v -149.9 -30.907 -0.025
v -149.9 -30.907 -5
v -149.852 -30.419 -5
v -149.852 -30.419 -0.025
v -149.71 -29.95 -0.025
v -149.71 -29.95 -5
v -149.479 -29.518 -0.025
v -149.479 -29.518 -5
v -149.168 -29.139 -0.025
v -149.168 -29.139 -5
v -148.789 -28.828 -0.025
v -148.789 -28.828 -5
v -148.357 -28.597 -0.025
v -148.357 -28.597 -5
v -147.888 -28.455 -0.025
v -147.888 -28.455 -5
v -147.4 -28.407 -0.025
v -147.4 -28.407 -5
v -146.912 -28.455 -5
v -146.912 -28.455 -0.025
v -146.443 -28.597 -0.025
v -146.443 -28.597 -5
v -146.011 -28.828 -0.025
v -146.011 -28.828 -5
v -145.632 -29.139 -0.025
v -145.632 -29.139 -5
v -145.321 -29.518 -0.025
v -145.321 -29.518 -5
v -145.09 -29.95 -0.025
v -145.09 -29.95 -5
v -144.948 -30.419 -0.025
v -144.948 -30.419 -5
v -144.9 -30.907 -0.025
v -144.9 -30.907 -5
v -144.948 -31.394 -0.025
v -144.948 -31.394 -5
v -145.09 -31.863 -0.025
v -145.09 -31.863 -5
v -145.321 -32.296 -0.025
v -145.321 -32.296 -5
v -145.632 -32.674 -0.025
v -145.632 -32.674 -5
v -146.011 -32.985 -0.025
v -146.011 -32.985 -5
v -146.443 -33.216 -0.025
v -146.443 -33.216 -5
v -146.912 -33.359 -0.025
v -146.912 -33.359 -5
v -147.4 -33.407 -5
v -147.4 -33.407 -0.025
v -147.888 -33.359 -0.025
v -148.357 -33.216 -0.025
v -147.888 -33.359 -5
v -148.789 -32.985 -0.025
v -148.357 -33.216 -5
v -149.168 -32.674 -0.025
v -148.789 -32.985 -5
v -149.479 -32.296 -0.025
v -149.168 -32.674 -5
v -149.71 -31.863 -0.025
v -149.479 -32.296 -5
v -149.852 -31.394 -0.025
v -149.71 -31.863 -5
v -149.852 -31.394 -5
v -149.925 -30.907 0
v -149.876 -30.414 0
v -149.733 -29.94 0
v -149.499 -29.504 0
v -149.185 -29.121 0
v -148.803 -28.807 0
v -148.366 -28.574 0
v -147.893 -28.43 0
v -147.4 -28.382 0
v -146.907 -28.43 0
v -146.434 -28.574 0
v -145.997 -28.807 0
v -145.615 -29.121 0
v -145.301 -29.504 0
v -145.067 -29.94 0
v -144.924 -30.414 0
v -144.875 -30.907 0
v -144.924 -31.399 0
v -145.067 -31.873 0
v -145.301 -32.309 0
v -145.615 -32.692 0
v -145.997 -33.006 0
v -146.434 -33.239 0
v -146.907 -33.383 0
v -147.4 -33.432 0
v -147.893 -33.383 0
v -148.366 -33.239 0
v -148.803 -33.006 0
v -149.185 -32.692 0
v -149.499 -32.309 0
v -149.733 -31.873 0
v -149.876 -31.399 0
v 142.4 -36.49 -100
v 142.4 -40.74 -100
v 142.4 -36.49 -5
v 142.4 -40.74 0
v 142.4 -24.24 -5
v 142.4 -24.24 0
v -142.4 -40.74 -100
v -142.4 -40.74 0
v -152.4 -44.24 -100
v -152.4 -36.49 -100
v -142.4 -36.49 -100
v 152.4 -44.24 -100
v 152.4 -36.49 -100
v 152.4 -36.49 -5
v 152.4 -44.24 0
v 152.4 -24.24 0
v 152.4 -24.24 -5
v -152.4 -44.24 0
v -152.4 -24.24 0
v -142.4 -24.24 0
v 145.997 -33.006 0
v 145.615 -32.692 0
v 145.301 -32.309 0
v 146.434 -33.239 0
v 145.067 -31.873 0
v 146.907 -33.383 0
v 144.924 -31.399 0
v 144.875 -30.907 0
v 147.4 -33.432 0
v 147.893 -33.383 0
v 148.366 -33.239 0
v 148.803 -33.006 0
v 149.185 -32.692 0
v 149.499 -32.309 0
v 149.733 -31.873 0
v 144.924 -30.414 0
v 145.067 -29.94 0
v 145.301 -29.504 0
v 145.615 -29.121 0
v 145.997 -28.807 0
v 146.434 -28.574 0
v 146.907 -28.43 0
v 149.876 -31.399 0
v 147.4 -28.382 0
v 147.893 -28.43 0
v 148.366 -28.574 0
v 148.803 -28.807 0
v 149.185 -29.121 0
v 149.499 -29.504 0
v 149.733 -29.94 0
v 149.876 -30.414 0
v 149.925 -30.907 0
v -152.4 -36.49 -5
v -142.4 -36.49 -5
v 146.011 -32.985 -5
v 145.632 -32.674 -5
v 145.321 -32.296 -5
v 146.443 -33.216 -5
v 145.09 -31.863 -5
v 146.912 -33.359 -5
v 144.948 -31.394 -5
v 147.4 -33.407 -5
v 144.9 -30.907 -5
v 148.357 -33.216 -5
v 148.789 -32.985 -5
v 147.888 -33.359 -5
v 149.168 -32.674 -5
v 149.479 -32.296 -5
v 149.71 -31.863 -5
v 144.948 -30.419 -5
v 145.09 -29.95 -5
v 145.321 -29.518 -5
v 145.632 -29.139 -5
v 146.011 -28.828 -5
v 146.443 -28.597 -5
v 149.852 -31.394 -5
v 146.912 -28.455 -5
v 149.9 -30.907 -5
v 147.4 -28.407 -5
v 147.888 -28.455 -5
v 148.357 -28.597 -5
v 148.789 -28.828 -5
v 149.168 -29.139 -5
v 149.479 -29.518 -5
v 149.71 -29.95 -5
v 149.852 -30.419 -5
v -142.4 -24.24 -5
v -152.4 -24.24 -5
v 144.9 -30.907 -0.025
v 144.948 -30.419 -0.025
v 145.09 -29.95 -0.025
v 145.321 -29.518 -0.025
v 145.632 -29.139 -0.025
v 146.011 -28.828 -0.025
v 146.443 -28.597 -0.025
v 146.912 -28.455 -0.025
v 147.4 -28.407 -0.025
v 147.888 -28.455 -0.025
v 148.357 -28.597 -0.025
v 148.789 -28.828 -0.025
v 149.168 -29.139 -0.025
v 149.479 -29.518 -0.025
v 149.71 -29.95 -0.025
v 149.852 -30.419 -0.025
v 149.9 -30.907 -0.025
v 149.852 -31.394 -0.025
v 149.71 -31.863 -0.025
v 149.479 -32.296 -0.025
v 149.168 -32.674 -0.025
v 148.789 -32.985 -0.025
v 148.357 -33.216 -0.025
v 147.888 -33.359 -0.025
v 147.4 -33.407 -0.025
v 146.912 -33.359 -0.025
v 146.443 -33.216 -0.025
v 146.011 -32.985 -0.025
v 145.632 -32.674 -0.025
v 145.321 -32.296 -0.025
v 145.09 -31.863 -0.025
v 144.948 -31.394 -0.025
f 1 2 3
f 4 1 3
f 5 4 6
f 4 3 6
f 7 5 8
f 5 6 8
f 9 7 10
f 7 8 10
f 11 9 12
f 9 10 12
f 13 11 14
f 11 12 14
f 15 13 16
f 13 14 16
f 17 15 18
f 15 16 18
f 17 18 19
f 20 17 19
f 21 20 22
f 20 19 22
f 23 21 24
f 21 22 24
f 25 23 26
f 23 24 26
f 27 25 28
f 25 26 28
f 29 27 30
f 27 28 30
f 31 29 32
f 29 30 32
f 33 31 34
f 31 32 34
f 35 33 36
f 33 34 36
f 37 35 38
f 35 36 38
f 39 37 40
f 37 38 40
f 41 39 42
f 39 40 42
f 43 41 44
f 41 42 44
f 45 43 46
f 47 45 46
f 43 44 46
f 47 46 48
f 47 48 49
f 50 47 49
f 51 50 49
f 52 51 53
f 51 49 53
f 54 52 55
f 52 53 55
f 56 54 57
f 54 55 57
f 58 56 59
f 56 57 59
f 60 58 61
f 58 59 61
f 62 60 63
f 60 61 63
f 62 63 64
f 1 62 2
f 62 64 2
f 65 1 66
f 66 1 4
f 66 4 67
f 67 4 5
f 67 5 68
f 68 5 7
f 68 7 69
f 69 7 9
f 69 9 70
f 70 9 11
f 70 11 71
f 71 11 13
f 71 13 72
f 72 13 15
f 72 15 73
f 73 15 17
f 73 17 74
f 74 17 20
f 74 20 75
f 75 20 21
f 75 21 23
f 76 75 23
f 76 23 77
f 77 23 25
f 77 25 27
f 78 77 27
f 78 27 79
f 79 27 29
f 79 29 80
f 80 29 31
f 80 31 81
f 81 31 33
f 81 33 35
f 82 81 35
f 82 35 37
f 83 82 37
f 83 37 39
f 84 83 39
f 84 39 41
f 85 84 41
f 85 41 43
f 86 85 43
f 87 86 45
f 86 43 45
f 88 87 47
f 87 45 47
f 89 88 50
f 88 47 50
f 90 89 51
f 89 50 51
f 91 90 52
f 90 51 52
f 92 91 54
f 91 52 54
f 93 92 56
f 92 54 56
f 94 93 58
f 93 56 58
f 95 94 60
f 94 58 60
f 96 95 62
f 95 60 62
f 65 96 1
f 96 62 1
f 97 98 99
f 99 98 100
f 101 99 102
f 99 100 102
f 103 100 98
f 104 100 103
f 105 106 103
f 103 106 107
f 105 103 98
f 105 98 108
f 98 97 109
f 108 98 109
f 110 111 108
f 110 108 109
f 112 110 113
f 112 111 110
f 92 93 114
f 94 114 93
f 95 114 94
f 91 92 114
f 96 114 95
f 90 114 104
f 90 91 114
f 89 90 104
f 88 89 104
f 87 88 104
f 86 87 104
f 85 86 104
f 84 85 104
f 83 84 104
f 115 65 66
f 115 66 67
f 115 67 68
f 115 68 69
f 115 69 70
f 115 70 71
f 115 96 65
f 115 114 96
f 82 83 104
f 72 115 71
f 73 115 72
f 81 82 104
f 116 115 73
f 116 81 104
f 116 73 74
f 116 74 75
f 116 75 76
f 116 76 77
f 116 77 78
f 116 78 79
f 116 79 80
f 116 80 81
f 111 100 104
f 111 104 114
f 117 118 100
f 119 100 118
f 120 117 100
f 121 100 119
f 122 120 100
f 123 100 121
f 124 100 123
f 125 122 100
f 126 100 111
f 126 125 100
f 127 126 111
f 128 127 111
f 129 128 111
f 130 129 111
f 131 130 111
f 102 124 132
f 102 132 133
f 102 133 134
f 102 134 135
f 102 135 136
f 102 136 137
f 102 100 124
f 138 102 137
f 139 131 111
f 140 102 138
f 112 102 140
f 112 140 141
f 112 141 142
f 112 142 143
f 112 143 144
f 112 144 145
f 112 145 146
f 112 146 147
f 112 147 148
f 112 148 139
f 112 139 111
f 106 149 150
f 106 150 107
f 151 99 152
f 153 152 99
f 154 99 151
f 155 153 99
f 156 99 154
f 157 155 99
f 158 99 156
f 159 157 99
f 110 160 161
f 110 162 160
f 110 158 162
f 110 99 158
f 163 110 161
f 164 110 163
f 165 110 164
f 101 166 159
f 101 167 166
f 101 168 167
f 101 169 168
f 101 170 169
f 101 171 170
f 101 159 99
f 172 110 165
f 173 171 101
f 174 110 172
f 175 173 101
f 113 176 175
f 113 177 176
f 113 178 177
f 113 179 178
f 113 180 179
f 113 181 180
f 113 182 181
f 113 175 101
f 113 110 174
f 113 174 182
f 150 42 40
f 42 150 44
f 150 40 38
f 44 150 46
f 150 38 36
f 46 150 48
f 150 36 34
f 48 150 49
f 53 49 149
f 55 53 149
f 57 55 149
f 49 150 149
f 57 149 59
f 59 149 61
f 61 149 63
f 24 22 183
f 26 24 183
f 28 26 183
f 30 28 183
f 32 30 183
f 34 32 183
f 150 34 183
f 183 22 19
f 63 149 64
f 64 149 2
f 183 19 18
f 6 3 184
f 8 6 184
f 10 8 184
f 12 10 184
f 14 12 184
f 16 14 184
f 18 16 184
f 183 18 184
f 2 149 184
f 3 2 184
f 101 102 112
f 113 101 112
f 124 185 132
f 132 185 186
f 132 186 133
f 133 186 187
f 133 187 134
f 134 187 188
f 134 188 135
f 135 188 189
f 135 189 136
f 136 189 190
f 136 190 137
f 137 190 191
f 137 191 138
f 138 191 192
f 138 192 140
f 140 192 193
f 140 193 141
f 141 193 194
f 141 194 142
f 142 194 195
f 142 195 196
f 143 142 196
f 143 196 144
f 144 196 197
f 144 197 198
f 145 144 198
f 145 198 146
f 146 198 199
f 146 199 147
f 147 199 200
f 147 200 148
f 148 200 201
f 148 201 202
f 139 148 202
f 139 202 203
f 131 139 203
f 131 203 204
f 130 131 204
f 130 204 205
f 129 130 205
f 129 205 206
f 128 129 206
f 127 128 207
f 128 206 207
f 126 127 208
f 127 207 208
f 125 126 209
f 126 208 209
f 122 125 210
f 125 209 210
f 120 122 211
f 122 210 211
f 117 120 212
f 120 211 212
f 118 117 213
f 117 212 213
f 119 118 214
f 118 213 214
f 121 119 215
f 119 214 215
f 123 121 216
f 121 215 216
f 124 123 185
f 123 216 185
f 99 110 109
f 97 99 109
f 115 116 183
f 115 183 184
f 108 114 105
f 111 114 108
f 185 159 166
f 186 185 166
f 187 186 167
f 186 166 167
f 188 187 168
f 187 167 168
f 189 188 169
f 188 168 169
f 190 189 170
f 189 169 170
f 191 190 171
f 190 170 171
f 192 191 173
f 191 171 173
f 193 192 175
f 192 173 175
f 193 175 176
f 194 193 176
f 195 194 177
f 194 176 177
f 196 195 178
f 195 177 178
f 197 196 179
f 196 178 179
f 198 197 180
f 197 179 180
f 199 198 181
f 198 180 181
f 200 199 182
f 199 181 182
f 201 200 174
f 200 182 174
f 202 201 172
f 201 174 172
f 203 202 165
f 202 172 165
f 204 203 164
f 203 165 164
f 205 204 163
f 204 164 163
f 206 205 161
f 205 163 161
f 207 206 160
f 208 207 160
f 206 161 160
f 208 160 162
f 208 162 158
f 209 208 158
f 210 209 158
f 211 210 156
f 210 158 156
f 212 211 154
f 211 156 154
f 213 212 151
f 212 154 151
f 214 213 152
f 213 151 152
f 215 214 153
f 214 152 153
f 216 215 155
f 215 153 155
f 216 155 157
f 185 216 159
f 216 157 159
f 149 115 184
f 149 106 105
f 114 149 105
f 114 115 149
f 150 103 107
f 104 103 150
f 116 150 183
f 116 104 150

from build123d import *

# Parameters (mm, degrees)
SKETCH1_W                       = 10
SKETCH1_H                       = 16.5
BOSS_EXTRUDE1_DEPTH             = 100
F_5_0MM_DOWEL_HOLE3_D           = 5
F_5_0MM_DOWEL_HOLE3_DEPTH       = 100
F_5_0MM_DOWEL_HOLE3_CSINK_D     = 5.05
F_5_0MM_DOWEL_HOLE3_CSINK_ANGLE = 90
F_5_0MM_DOWEL_HOLE3_TIP         = 1.502151548
SKETCH8_R                       = 2.5
BOSS_EXTRUDE2_DEPTH             = 100
SKETCH11_W                      = 7.604101256
SKETCH11_H                      = 6.322975501
BOSS_EXTRUDE3_DEPTH             = 10
SKETCH10_W                      = 95
SKETCH10_H                      = 12.25
CUT_EXTRUDE3_DEPTH              = 10
SKETCH12_W                      = 7.319773992
SKETCH12_H                      = 6.84369113
BOSS_EXTRUDE4_DEPTH             = 5


with BuildPart() as part:
    # Sketch1 → Boss-Extrude1 (new body)
    with BuildSketch(Plane.XY):
        Polygon((-152.4, -40.74), (-142.4, -40.74), (-142.4, -24.24), (-152.4, -24.24), (-152.4, -24.840528939), align=None)
        Polygon((0, -44.24), (0, -40.74), (-142.4, -40.74), (-152.4, -40.74), (-152.4, -44.24), align=None)
        Polygon((142.4, -40.74), (0, -40.74), (0, -44.24), (152.4, -44.24), (152.4, -40.74), align=None)
        with Locations((147.4, -32.49)):
            Rectangle(SKETCH1_W, SKETCH1_H)
    extrude(amount=-BOSS_EXTRUDE1_DEPTH)

    # Ø5.0mm Dowel Hole3
    with Locations(Plane.XY):
        with Locations((-147.4, -30.906666667), (-147.4, -37.573333333), (147.4, -30.906666667), (147.4, -37.573333333)):
            CounterSinkHole(F_5_0MM_DOWEL_HOLE3_D / 2, F_5_0MM_DOWEL_HOLE3_CSINK_D / 2, depth=F_5_0MM_DOWEL_HOLE3_DEPTH, counter_sink_angle=F_5_0MM_DOWEL_HOLE3_CSINK_ANGLE)
            with Locations((0, 0, -(F_5_0MM_DOWEL_HOLE3_DEPTH + F_5_0MM_DOWEL_HOLE3_TIP / 2))):  # 118° drill point
                Cone(0, F_5_0MM_DOWEL_HOLE3_D / 2, F_5_0MM_DOWEL_HOLE3_TIP, mode=Mode.SUBTRACT)

    # Sketch8 → Boss-Extrude2 (add)
    with BuildSketch(Plane(origin=(0, 0, -100), x_dir=(-1, 0, 0), z_dir=(0, 0, -1))):
        with Locations((147.4, -37.573333333)):
            Circle(SKETCH8_R)
    boss_extrude2 = extrude(amount=-BOSS_EXTRUDE2_DEPTH)

    # Sketch11 → Boss-Extrude3 (add)
    with BuildSketch(Plane.XY):
        with Locations((-147.317312743, -37.707651596)):
            Rectangle(SKETCH11_W, SKETCH11_H)
    extrude(amount=-BOSS_EXTRUDE3_DEPTH)

    # Mirror4: Boss-Extrude2 across plane
    add(boss_extrude2.mirror(Plane(origin=(0, 0, 0), x_dir=(0, 0, 1), z_dir=(1, 0, 0))))

    # Sketch10 → Cut-Extrude3 (cut)
    with BuildSketch(Plane(origin=(152.4, 0, 0), x_dir=(0, 0, -1), z_dir=(1, 0, 0))):
        with Locations((52.5, -30.365)):
            Rectangle(SKETCH10_W, SKETCH10_H)
    cut_extrude3 = extrude(amount=-CUT_EXTRUDE3_DEPTH, mode=Mode.SUBTRACT)

    # Mirror5: Cut-Extrude3 across plane
    add(cut_extrude3.mirror(Plane(origin=(0, 0, 0), x_dir=(0, 0, 1), z_dir=(1, 0, 0))), mode=Mode.SUBTRACT)

    # Sketch12 → Boss-Extrude4 (add)
    with BuildSketch(Plane.XY):
        with Locations((147.557359199, -37.793735485)):
            Rectangle(SKETCH12_W, SKETCH12_H)
    extrude(amount=-BOSS_EXTRUDE4_DEPTH)


solid = part.part
